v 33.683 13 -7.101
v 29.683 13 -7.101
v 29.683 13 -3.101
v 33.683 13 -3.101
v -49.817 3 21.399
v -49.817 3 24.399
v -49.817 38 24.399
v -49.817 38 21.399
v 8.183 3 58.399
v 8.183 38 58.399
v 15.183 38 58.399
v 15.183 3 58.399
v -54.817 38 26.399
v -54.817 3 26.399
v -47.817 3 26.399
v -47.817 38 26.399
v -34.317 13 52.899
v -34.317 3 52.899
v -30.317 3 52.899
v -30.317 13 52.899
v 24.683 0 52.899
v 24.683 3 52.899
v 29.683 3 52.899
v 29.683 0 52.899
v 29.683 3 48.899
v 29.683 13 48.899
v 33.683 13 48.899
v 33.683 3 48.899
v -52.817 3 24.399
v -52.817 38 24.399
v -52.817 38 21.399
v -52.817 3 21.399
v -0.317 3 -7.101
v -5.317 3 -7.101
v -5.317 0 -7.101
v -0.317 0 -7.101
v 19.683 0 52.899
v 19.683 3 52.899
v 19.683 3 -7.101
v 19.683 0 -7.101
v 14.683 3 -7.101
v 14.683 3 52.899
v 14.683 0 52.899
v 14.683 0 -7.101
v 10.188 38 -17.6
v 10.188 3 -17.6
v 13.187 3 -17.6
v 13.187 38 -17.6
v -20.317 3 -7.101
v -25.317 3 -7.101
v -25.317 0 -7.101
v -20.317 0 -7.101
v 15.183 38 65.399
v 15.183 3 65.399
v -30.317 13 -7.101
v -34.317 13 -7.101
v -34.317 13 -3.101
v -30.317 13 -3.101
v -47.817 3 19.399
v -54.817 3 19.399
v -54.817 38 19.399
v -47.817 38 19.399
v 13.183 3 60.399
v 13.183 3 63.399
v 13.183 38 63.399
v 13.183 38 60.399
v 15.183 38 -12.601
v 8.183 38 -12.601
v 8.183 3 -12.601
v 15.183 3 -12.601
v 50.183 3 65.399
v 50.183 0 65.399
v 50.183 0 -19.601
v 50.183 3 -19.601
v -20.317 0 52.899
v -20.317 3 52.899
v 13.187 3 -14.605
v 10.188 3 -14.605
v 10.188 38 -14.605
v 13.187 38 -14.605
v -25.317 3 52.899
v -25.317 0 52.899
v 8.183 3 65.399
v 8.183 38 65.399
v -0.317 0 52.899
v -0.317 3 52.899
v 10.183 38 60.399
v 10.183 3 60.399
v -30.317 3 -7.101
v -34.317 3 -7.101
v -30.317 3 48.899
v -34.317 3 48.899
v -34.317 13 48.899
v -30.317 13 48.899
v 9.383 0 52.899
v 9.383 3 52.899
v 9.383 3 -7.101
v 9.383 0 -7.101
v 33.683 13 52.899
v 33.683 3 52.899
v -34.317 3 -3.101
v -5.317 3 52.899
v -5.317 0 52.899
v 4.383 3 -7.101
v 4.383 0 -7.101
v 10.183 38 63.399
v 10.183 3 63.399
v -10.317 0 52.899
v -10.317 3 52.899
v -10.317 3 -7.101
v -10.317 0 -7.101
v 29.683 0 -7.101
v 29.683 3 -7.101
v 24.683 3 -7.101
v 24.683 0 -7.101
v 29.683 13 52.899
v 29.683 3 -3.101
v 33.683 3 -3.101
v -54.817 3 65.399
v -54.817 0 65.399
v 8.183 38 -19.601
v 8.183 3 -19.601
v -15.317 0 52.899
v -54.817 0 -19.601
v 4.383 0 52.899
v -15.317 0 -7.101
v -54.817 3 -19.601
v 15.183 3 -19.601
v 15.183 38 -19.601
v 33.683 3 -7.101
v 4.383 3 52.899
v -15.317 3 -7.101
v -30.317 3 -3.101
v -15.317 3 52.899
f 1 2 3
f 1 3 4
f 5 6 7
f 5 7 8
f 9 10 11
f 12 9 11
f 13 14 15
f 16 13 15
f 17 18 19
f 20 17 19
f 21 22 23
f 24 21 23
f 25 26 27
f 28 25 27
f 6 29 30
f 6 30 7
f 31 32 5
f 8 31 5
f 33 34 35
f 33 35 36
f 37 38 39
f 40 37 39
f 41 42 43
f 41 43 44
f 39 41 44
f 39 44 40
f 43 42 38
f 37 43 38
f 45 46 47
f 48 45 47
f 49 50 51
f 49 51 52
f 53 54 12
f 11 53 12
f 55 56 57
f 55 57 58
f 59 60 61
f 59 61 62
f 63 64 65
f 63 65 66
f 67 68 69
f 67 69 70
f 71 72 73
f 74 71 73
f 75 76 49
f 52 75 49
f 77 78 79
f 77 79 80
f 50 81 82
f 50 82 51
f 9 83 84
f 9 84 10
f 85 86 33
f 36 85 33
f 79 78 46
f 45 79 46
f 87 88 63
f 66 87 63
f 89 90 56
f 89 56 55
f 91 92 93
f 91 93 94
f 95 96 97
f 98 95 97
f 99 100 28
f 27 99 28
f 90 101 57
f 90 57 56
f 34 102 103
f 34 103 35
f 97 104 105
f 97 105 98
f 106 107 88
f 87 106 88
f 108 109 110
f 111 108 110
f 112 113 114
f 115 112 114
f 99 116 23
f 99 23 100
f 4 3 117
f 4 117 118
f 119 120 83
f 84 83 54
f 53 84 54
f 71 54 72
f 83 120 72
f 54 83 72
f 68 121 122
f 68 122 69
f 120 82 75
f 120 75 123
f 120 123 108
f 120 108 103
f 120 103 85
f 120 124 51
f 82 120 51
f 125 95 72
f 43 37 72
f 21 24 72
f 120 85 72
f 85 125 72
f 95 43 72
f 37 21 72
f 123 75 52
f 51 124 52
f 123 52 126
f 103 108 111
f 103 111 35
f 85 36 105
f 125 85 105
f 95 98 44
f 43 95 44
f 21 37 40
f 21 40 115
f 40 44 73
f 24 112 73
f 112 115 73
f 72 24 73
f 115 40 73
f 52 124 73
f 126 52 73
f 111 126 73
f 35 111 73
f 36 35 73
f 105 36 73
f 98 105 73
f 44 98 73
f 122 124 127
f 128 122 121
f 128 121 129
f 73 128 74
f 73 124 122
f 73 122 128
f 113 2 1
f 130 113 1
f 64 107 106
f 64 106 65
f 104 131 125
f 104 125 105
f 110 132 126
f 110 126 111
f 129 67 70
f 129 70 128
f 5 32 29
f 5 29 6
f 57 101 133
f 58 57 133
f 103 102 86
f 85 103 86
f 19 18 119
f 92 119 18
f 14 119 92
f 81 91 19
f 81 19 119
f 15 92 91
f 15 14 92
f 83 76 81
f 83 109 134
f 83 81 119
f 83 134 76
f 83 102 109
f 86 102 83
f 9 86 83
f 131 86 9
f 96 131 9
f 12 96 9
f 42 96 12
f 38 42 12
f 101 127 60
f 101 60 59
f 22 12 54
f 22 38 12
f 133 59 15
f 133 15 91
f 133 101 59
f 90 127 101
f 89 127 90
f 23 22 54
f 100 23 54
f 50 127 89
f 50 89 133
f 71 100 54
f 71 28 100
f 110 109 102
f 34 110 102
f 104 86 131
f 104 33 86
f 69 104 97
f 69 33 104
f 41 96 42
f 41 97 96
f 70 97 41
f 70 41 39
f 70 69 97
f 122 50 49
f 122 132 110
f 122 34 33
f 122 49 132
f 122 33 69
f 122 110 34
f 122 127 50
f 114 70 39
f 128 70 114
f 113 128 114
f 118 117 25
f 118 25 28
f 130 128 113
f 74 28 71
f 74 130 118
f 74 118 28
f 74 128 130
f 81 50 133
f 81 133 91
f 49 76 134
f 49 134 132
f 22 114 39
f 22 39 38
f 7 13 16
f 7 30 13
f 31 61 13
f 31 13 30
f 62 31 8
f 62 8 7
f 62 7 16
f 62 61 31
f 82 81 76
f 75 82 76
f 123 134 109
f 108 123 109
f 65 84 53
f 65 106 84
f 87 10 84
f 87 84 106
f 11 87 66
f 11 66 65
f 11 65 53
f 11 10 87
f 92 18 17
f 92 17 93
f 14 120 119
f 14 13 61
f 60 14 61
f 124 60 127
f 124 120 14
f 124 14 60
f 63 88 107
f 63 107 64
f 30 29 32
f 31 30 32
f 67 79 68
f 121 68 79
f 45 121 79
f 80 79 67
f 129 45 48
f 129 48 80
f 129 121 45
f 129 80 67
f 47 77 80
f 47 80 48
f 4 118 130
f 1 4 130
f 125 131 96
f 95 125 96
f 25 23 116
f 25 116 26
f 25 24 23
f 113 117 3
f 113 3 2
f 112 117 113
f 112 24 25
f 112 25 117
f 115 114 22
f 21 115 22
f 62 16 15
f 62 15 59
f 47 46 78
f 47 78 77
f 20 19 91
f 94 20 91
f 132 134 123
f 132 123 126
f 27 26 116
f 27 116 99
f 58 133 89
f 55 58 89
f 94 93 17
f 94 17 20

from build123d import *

# Parameters (mm, degrees)
SKETCH3_W           = 105
SKETCH3_H           = 85
BOSS_EXTRUDE3_DEPTH = 3
SKETCH5_W           = 7
SKETCH5_H           = 7
SKETCH5_W_2         = 3
SKETCH5_H_2         = 3
BOSS_EXTRUDE4_DEPTH = 35
SKETCH9_W           = 2.998895248
SKETCH9_H           = 2.995380601
BOSS_EXTRUDE5_DEPTH = 35
SKETCH11_W          = 7
SKETCH11_H          = 7
SKETCH11_W_2        = 3
SKETCH11_H_2        = 3
BOSS_EXTRUDE6_DEPTH = 35
CUT_EXTRUDE1_DEPTH  = 6
SKETCH14_W          = 5
SKETCH14_H          = 60
CUT_EXTRUDE3_DEPTH  = 33
SKETCH17_W          = 5
SKETCH17_H          = 60
CUT_EXTRUDE4_DEPTH  = 15
SKETCH18_W          = 4
SKETCH18_H          = 4
BOSS_EXTRUDE7_DEPTH = 10


with BuildPart() as part:
    # Sketch3 → Boss-Extrude3 (new body)
    with BuildSketch(Plane(origin=(0, 0, 0), x_dir=(1, 0, 0), z_dir=(0, 1, 0))):
        with Locations((-2.316884661, -22.898810939)):
            Rectangle(SKETCH3_W, SKETCH3_H)
    extrude(amount=BOSS_EXTRUDE3_DEPTH)

    # Sketch5 → Boss-Extrude4 (add)
    with BuildSketch(Plane(origin=(0, 3, 0), x_dir=(1, 0, 0), z_dir=(0, 1, 0))):
        with Locations((11.683115339, -61.898810939)):
            Rectangle(SKETCH5_W, SKETCH5_H)
        with Locations((11.683115339, -61.898810939)):
            Rectangle(SKETCH5_W_2, SKETCH5_H_2, mode=Mode.SUBTRACT)
    extrude(amount=BOSS_EXTRUDE4_DEPTH)

    # Sketch9 → Boss-Extrude5 (add)
    with BuildSketch(Plane(origin=(0, 3, 0), x_dir=(1, 0, 0), z_dir=(0, 1, 0))):
        Polygon((15.183115339, 12.601189061), (15.183115339, 19.601189061), (8.183115339, 19.601189061), (8.183115339, 17.600348451), (8.183115339, 12.601189061), align=None)
        with Locations((11.687877227, 16.102658151)):
            Rectangle(SKETCH9_W, SKETCH9_H, mode=Mode.SUBTRACT)
    extrude(amount=BOSS_EXTRUDE5_DEPTH)

    # Sketch11 → Boss-Extrude6 (add)
    with BuildSketch(Plane(origin=(0, 3, 0), x_dir=(1, 0, 0), z_dir=(0, 1, 0))):
        with Locations((-51.316884661, -22.898810939)):
            Rectangle(SKETCH11_W, SKETCH11_H)
        with Locations((-51.316884661, -22.898810939)):
            Rectangle(SKETCH11_W_2, SKETCH11_H_2, mode=Mode.SUBTRACT)
    extrude(amount=BOSS_EXTRUDE6_DEPTH)

    # Sketch12 → Cut-Extrude1 (cut)
    with BuildSketch(Plane(origin=(0, 3, 0), x_dir=(1, 0, 0), z_dir=(0, 1, 0))):
        Polygon((29.683115339, -52.898810939), (29.683115339, -48.898810939), (29.683115339, 3.101189061), (29.683115339, 7.101189061), (24.683115339, 7.101189061), (24.683115339, -52.898810939), align=None)
    extrude(amount=-CUT_EXTRUDE1_DEPTH, mode=Mode.SUBTRACT)

    # Sketch14 → Cut-Extrude3 (cut)
    with BuildSketch(Plane(origin=(0, 3, 0), x_dir=(1, 0, 0), z_dir=(0, 1, 0))):
        with Locations((17.183115339, -22.898810939)):
            Rectangle(SKETCH14_W, SKETCH14_H)
        with Locations((-2.816884661, -22.898810939)):
            Rectangle(SKETCH14_W, SKETCH14_H)
        with Locations((-22.816884661, -22.898810939)):
            Rectangle(SKETCH14_W, SKETCH14_H)
        with Locations((-12.816884661, -22.898810939)):
            Rectangle(SKETCH14_W, SKETCH14_H)
    extrude(amount=-CUT_EXTRUDE3_DEPTH, mode=Mode.SUBTRACT)

    # Sketch17 → Cut-Extrude4 (cut)
    with BuildSketch(Plane(origin=(0, 3, 0), x_dir=(1, 0, 0), z_dir=(0, 1, 0))):
        with Locations((6.882849783, -22.898810939)):
            Rectangle(SKETCH17_W, SKETCH17_H)
    extrude(amount=-CUT_EXTRUDE4_DEPTH, mode=Mode.SUBTRACT)

    # Sketch18 → Boss-Extrude7 (add)
    with BuildSketch(Plane(origin=(0, 3, 0), x_dir=(1, 0, 0), z_dir=(0, 1, 0))):
        with Locations((31.683115339, -50.898810939)):
            Rectangle(SKETCH18_W, SKETCH18_H)
        with Locations((31.683115339, 5.101189061)):
            Rectangle(SKETCH18_W, SKETCH18_H)
        with Locations((-32.316884661, 5.101189061)):
            Rectangle(SKETCH18_W, SKETCH18_H)
        with Locations((-32.316884661, -50.898810939)):
            Rectangle(SKETCH18_W, SKETCH18_H)
    extrude(amount=BOSS_EXTRUDE7_DEPTH)


solid = part.part
